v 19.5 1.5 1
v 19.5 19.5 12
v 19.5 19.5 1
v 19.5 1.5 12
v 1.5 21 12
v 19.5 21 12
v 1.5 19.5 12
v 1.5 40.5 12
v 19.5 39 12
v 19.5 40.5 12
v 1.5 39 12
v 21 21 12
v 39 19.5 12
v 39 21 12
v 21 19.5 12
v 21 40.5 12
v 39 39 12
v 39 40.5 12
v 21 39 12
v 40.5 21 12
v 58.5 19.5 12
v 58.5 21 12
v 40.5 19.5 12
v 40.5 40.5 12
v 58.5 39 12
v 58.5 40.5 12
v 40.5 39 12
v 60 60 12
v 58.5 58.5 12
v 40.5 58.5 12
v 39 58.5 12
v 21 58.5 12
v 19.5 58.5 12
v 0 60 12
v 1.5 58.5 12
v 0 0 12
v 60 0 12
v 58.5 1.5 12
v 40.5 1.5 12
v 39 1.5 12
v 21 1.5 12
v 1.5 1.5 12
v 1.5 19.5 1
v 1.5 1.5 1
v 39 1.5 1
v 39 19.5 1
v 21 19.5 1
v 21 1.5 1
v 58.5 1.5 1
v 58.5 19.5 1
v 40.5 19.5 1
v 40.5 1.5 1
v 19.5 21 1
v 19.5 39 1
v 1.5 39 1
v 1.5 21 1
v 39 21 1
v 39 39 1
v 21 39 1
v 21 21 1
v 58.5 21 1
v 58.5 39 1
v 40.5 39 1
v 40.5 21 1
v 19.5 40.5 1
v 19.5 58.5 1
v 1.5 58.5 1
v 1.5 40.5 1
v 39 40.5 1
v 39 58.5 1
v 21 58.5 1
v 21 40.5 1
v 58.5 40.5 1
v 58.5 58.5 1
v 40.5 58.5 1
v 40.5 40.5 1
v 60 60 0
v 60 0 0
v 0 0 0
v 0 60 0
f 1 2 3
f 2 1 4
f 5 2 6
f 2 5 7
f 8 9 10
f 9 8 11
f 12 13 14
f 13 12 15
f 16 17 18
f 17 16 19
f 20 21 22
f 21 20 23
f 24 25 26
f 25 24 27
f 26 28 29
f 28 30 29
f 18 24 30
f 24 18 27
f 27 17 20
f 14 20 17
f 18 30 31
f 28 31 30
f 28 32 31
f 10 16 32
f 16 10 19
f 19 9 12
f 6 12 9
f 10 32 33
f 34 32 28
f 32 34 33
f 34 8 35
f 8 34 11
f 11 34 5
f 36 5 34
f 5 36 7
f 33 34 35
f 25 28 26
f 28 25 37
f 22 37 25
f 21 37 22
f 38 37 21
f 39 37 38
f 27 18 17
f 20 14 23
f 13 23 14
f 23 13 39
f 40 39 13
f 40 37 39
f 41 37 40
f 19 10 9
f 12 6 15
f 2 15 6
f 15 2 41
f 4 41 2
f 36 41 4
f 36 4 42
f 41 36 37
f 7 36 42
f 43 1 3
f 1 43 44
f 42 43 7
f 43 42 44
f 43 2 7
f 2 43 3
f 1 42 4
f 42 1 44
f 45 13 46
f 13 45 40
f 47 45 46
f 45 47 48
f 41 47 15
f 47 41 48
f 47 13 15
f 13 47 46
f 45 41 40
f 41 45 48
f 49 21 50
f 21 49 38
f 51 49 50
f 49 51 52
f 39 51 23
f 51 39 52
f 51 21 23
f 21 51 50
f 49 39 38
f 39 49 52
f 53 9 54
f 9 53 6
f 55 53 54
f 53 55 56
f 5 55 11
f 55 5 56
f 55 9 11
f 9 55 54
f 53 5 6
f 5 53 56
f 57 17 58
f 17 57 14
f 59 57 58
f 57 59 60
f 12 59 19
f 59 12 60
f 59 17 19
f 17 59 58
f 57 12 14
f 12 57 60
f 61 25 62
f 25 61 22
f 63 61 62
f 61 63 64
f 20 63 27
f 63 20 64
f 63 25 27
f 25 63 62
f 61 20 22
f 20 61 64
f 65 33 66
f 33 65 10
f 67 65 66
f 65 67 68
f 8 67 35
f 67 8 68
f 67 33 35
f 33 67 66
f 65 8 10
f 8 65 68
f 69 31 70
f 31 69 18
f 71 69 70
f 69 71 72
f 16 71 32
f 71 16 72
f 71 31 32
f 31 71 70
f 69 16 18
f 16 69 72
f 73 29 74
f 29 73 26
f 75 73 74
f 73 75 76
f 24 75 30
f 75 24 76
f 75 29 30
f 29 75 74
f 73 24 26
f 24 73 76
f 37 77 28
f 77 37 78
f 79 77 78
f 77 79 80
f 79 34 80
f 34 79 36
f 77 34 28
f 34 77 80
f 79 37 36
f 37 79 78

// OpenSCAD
bin_size=18;
wall_size=1.5;
height=12;
base=1;

x_cubes = 3;
y_cubes = 3;

cube_vector = [bin_size, bin_size, height-base];

difference() {
  cube([bin_size*x_cubes+wall_size*(x_cubes+1), bin_size*y_cubes+wall_size*(y_cubes+1), height]);
for ( j = [0 : y_cubes-1] ) { 
  for ( i = [0 : x_cubes-1] ) {
    translate([wall_size*(i+1)+bin_size*i, wall_size*(j+1)+bin_size*j, base]) cube(cube_vector);
  }
}

}
